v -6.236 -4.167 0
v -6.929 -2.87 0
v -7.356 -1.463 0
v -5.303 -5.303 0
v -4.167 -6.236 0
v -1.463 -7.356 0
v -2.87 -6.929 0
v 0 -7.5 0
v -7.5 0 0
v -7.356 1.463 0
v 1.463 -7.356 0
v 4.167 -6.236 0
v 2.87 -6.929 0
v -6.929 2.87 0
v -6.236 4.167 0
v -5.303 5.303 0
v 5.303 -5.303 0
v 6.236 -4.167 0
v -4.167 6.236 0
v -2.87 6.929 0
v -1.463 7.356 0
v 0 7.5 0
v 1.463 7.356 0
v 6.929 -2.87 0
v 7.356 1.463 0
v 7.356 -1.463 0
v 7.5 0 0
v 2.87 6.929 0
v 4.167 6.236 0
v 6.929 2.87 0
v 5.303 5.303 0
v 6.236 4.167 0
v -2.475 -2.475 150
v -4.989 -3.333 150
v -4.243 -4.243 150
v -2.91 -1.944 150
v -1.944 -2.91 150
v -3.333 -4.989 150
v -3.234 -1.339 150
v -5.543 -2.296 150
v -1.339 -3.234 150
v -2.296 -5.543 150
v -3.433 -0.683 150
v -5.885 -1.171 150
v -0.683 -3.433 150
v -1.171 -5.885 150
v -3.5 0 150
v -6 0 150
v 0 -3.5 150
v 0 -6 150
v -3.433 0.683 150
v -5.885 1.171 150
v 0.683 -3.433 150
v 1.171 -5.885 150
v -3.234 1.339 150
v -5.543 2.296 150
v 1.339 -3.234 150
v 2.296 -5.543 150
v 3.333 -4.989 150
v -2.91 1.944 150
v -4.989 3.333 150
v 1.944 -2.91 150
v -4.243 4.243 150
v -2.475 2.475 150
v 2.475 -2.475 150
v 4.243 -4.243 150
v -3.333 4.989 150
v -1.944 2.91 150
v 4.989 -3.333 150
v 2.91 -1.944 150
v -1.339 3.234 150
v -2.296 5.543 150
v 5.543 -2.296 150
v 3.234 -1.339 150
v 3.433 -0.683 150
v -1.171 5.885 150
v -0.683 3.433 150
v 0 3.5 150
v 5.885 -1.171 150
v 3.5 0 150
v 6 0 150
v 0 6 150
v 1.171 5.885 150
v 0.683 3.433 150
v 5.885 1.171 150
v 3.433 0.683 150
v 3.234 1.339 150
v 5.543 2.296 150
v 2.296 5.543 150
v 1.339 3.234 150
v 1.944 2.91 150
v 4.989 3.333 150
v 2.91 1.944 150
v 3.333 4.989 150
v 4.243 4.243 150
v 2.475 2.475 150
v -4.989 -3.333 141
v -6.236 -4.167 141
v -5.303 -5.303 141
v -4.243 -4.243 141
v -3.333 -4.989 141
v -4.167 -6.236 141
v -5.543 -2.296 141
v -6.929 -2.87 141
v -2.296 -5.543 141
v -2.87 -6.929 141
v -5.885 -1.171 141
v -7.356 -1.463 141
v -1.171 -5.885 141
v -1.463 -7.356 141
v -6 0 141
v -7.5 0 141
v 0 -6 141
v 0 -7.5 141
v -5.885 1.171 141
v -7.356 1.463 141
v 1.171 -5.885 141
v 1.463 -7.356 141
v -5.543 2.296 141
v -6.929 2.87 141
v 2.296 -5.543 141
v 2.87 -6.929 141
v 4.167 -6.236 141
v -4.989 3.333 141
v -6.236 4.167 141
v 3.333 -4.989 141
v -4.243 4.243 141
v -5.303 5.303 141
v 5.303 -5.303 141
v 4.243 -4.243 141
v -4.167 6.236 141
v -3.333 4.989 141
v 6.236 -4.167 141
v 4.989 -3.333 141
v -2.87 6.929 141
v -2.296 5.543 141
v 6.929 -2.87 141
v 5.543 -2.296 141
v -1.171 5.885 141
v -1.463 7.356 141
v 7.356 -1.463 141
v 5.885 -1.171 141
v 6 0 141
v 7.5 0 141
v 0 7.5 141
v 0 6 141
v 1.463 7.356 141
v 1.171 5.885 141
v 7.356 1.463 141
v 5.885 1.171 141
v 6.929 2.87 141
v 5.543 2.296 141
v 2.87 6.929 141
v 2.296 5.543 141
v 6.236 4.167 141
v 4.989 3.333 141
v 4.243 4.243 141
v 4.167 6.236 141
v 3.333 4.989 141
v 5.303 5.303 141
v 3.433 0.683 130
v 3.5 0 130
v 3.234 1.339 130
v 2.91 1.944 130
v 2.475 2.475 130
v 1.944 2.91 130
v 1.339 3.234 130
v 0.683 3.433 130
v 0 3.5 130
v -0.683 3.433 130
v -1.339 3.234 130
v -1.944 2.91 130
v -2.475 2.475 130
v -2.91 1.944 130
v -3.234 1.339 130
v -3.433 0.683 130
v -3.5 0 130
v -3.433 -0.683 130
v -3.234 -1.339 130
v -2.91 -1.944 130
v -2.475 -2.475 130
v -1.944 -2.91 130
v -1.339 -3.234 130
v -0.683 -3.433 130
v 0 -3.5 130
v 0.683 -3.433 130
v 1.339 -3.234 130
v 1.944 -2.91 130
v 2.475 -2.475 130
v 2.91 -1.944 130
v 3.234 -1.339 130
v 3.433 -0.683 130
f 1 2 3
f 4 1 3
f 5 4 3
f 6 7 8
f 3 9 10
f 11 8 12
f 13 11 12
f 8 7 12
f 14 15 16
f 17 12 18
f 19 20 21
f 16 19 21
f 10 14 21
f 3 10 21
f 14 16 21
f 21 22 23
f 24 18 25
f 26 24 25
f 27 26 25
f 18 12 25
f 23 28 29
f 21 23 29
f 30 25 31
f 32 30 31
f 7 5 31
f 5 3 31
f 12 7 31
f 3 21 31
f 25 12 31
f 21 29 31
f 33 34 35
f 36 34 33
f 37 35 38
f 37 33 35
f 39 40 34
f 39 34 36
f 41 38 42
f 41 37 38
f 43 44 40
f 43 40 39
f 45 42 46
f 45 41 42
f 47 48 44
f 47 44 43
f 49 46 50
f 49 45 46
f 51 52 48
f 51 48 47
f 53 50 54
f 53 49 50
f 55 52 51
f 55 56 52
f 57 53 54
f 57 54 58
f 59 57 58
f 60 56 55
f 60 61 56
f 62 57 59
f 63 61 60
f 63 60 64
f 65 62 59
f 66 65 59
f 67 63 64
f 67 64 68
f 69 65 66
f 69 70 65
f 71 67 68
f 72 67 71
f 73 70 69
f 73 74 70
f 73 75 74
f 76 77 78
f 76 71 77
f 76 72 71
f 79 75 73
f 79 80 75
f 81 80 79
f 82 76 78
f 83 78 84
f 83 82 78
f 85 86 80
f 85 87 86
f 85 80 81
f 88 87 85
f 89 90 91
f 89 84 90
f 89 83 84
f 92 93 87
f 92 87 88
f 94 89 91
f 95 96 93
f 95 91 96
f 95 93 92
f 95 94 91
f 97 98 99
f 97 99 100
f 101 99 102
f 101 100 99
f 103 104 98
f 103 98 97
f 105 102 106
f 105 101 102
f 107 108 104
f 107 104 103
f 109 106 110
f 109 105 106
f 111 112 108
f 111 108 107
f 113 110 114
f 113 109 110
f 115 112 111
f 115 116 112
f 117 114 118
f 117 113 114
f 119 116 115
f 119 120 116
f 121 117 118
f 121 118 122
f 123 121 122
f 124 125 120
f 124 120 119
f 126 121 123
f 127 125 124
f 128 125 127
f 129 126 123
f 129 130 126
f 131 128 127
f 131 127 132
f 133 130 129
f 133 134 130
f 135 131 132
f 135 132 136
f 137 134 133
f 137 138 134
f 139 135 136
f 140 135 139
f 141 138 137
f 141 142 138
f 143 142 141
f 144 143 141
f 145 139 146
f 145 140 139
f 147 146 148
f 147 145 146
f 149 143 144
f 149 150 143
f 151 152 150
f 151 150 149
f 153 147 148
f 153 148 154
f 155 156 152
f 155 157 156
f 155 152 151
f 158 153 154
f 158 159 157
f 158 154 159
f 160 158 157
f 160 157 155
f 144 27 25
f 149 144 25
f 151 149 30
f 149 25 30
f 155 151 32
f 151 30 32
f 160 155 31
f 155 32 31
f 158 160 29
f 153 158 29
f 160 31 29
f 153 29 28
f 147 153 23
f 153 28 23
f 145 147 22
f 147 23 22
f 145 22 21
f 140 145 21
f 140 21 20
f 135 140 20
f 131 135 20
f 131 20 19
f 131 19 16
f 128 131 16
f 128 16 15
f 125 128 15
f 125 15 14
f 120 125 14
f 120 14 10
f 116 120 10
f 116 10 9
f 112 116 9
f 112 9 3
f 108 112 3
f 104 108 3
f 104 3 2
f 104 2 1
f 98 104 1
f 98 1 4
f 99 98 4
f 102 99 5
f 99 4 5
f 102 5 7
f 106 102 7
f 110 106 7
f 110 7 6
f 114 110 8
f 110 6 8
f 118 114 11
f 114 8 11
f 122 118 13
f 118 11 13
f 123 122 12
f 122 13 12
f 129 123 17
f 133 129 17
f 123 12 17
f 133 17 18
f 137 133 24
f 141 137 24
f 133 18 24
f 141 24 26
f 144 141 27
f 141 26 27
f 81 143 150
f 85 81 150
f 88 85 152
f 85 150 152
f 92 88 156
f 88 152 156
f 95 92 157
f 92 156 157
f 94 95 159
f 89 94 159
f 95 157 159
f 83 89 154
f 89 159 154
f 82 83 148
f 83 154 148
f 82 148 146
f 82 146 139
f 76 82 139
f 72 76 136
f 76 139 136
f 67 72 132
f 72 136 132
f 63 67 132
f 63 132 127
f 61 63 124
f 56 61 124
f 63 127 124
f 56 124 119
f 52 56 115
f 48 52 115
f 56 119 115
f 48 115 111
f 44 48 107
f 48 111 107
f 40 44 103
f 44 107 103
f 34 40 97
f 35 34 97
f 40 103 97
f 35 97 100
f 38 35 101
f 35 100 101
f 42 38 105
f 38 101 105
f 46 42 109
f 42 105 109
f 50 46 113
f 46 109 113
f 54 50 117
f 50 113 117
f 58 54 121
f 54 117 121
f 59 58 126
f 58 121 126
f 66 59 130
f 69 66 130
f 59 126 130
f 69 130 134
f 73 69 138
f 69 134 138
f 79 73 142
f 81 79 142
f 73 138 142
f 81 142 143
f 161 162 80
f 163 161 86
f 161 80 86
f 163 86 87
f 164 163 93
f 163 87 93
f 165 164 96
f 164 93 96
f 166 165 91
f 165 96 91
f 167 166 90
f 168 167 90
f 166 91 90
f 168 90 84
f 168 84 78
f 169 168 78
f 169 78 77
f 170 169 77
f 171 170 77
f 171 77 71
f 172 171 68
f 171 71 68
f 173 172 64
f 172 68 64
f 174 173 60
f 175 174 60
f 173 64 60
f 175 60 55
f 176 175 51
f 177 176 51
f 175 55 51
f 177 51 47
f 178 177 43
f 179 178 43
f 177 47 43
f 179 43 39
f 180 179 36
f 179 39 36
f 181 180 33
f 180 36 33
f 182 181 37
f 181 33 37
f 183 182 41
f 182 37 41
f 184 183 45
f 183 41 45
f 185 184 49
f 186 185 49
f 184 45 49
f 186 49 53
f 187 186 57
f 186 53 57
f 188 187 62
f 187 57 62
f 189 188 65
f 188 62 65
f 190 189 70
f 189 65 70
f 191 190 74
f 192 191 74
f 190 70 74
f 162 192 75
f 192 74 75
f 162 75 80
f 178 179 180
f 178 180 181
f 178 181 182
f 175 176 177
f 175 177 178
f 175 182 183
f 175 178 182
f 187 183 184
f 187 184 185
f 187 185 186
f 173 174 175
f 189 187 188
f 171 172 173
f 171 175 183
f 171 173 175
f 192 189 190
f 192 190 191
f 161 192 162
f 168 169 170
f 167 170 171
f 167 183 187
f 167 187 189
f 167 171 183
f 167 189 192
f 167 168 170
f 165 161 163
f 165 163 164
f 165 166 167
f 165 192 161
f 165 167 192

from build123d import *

# Parameters (mm, degrees)
SKETCH1_R           = 7.5
BOSS_EXTRUDE1_DEPTH = 150
CUT_EXTRUDE1_START  = -9
SKETCH2_R           = 7.5
SKETCH2_R_2         = 6
CUT_EXTRUDE1_DEPTH  = 9
SKETCH3_R           = 3.5
CUT_EXTRUDE2_DEPTH  = 20


with BuildPart() as part:
    # Sketch1 → Boss-Extrude1 (new body)
    with BuildSketch(Plane.XY):
        Circle(SKETCH1_R)
    extrude(amount=BOSS_EXTRUDE1_DEPTH)

    # Sketch2 → Cut-Extrude1 (cut)
    with BuildSketch(Plane.XY.offset(150).offset(CUT_EXTRUDE1_START)):
        Circle(SKETCH2_R)
        Circle(SKETCH2_R_2, mode=Mode.SUBTRACT)
    extrude(amount=CUT_EXTRUDE1_DEPTH, mode=Mode.SUBTRACT)

    # Sketch3 → Cut-Extrude2 (cut)
    with BuildSketch(Plane.XY.offset(150)):
        Circle(SKETCH3_R)
    extrude(amount=-CUT_EXTRUDE2_DEPTH, mode=Mode.SUBTRACT)


solid = part.part
